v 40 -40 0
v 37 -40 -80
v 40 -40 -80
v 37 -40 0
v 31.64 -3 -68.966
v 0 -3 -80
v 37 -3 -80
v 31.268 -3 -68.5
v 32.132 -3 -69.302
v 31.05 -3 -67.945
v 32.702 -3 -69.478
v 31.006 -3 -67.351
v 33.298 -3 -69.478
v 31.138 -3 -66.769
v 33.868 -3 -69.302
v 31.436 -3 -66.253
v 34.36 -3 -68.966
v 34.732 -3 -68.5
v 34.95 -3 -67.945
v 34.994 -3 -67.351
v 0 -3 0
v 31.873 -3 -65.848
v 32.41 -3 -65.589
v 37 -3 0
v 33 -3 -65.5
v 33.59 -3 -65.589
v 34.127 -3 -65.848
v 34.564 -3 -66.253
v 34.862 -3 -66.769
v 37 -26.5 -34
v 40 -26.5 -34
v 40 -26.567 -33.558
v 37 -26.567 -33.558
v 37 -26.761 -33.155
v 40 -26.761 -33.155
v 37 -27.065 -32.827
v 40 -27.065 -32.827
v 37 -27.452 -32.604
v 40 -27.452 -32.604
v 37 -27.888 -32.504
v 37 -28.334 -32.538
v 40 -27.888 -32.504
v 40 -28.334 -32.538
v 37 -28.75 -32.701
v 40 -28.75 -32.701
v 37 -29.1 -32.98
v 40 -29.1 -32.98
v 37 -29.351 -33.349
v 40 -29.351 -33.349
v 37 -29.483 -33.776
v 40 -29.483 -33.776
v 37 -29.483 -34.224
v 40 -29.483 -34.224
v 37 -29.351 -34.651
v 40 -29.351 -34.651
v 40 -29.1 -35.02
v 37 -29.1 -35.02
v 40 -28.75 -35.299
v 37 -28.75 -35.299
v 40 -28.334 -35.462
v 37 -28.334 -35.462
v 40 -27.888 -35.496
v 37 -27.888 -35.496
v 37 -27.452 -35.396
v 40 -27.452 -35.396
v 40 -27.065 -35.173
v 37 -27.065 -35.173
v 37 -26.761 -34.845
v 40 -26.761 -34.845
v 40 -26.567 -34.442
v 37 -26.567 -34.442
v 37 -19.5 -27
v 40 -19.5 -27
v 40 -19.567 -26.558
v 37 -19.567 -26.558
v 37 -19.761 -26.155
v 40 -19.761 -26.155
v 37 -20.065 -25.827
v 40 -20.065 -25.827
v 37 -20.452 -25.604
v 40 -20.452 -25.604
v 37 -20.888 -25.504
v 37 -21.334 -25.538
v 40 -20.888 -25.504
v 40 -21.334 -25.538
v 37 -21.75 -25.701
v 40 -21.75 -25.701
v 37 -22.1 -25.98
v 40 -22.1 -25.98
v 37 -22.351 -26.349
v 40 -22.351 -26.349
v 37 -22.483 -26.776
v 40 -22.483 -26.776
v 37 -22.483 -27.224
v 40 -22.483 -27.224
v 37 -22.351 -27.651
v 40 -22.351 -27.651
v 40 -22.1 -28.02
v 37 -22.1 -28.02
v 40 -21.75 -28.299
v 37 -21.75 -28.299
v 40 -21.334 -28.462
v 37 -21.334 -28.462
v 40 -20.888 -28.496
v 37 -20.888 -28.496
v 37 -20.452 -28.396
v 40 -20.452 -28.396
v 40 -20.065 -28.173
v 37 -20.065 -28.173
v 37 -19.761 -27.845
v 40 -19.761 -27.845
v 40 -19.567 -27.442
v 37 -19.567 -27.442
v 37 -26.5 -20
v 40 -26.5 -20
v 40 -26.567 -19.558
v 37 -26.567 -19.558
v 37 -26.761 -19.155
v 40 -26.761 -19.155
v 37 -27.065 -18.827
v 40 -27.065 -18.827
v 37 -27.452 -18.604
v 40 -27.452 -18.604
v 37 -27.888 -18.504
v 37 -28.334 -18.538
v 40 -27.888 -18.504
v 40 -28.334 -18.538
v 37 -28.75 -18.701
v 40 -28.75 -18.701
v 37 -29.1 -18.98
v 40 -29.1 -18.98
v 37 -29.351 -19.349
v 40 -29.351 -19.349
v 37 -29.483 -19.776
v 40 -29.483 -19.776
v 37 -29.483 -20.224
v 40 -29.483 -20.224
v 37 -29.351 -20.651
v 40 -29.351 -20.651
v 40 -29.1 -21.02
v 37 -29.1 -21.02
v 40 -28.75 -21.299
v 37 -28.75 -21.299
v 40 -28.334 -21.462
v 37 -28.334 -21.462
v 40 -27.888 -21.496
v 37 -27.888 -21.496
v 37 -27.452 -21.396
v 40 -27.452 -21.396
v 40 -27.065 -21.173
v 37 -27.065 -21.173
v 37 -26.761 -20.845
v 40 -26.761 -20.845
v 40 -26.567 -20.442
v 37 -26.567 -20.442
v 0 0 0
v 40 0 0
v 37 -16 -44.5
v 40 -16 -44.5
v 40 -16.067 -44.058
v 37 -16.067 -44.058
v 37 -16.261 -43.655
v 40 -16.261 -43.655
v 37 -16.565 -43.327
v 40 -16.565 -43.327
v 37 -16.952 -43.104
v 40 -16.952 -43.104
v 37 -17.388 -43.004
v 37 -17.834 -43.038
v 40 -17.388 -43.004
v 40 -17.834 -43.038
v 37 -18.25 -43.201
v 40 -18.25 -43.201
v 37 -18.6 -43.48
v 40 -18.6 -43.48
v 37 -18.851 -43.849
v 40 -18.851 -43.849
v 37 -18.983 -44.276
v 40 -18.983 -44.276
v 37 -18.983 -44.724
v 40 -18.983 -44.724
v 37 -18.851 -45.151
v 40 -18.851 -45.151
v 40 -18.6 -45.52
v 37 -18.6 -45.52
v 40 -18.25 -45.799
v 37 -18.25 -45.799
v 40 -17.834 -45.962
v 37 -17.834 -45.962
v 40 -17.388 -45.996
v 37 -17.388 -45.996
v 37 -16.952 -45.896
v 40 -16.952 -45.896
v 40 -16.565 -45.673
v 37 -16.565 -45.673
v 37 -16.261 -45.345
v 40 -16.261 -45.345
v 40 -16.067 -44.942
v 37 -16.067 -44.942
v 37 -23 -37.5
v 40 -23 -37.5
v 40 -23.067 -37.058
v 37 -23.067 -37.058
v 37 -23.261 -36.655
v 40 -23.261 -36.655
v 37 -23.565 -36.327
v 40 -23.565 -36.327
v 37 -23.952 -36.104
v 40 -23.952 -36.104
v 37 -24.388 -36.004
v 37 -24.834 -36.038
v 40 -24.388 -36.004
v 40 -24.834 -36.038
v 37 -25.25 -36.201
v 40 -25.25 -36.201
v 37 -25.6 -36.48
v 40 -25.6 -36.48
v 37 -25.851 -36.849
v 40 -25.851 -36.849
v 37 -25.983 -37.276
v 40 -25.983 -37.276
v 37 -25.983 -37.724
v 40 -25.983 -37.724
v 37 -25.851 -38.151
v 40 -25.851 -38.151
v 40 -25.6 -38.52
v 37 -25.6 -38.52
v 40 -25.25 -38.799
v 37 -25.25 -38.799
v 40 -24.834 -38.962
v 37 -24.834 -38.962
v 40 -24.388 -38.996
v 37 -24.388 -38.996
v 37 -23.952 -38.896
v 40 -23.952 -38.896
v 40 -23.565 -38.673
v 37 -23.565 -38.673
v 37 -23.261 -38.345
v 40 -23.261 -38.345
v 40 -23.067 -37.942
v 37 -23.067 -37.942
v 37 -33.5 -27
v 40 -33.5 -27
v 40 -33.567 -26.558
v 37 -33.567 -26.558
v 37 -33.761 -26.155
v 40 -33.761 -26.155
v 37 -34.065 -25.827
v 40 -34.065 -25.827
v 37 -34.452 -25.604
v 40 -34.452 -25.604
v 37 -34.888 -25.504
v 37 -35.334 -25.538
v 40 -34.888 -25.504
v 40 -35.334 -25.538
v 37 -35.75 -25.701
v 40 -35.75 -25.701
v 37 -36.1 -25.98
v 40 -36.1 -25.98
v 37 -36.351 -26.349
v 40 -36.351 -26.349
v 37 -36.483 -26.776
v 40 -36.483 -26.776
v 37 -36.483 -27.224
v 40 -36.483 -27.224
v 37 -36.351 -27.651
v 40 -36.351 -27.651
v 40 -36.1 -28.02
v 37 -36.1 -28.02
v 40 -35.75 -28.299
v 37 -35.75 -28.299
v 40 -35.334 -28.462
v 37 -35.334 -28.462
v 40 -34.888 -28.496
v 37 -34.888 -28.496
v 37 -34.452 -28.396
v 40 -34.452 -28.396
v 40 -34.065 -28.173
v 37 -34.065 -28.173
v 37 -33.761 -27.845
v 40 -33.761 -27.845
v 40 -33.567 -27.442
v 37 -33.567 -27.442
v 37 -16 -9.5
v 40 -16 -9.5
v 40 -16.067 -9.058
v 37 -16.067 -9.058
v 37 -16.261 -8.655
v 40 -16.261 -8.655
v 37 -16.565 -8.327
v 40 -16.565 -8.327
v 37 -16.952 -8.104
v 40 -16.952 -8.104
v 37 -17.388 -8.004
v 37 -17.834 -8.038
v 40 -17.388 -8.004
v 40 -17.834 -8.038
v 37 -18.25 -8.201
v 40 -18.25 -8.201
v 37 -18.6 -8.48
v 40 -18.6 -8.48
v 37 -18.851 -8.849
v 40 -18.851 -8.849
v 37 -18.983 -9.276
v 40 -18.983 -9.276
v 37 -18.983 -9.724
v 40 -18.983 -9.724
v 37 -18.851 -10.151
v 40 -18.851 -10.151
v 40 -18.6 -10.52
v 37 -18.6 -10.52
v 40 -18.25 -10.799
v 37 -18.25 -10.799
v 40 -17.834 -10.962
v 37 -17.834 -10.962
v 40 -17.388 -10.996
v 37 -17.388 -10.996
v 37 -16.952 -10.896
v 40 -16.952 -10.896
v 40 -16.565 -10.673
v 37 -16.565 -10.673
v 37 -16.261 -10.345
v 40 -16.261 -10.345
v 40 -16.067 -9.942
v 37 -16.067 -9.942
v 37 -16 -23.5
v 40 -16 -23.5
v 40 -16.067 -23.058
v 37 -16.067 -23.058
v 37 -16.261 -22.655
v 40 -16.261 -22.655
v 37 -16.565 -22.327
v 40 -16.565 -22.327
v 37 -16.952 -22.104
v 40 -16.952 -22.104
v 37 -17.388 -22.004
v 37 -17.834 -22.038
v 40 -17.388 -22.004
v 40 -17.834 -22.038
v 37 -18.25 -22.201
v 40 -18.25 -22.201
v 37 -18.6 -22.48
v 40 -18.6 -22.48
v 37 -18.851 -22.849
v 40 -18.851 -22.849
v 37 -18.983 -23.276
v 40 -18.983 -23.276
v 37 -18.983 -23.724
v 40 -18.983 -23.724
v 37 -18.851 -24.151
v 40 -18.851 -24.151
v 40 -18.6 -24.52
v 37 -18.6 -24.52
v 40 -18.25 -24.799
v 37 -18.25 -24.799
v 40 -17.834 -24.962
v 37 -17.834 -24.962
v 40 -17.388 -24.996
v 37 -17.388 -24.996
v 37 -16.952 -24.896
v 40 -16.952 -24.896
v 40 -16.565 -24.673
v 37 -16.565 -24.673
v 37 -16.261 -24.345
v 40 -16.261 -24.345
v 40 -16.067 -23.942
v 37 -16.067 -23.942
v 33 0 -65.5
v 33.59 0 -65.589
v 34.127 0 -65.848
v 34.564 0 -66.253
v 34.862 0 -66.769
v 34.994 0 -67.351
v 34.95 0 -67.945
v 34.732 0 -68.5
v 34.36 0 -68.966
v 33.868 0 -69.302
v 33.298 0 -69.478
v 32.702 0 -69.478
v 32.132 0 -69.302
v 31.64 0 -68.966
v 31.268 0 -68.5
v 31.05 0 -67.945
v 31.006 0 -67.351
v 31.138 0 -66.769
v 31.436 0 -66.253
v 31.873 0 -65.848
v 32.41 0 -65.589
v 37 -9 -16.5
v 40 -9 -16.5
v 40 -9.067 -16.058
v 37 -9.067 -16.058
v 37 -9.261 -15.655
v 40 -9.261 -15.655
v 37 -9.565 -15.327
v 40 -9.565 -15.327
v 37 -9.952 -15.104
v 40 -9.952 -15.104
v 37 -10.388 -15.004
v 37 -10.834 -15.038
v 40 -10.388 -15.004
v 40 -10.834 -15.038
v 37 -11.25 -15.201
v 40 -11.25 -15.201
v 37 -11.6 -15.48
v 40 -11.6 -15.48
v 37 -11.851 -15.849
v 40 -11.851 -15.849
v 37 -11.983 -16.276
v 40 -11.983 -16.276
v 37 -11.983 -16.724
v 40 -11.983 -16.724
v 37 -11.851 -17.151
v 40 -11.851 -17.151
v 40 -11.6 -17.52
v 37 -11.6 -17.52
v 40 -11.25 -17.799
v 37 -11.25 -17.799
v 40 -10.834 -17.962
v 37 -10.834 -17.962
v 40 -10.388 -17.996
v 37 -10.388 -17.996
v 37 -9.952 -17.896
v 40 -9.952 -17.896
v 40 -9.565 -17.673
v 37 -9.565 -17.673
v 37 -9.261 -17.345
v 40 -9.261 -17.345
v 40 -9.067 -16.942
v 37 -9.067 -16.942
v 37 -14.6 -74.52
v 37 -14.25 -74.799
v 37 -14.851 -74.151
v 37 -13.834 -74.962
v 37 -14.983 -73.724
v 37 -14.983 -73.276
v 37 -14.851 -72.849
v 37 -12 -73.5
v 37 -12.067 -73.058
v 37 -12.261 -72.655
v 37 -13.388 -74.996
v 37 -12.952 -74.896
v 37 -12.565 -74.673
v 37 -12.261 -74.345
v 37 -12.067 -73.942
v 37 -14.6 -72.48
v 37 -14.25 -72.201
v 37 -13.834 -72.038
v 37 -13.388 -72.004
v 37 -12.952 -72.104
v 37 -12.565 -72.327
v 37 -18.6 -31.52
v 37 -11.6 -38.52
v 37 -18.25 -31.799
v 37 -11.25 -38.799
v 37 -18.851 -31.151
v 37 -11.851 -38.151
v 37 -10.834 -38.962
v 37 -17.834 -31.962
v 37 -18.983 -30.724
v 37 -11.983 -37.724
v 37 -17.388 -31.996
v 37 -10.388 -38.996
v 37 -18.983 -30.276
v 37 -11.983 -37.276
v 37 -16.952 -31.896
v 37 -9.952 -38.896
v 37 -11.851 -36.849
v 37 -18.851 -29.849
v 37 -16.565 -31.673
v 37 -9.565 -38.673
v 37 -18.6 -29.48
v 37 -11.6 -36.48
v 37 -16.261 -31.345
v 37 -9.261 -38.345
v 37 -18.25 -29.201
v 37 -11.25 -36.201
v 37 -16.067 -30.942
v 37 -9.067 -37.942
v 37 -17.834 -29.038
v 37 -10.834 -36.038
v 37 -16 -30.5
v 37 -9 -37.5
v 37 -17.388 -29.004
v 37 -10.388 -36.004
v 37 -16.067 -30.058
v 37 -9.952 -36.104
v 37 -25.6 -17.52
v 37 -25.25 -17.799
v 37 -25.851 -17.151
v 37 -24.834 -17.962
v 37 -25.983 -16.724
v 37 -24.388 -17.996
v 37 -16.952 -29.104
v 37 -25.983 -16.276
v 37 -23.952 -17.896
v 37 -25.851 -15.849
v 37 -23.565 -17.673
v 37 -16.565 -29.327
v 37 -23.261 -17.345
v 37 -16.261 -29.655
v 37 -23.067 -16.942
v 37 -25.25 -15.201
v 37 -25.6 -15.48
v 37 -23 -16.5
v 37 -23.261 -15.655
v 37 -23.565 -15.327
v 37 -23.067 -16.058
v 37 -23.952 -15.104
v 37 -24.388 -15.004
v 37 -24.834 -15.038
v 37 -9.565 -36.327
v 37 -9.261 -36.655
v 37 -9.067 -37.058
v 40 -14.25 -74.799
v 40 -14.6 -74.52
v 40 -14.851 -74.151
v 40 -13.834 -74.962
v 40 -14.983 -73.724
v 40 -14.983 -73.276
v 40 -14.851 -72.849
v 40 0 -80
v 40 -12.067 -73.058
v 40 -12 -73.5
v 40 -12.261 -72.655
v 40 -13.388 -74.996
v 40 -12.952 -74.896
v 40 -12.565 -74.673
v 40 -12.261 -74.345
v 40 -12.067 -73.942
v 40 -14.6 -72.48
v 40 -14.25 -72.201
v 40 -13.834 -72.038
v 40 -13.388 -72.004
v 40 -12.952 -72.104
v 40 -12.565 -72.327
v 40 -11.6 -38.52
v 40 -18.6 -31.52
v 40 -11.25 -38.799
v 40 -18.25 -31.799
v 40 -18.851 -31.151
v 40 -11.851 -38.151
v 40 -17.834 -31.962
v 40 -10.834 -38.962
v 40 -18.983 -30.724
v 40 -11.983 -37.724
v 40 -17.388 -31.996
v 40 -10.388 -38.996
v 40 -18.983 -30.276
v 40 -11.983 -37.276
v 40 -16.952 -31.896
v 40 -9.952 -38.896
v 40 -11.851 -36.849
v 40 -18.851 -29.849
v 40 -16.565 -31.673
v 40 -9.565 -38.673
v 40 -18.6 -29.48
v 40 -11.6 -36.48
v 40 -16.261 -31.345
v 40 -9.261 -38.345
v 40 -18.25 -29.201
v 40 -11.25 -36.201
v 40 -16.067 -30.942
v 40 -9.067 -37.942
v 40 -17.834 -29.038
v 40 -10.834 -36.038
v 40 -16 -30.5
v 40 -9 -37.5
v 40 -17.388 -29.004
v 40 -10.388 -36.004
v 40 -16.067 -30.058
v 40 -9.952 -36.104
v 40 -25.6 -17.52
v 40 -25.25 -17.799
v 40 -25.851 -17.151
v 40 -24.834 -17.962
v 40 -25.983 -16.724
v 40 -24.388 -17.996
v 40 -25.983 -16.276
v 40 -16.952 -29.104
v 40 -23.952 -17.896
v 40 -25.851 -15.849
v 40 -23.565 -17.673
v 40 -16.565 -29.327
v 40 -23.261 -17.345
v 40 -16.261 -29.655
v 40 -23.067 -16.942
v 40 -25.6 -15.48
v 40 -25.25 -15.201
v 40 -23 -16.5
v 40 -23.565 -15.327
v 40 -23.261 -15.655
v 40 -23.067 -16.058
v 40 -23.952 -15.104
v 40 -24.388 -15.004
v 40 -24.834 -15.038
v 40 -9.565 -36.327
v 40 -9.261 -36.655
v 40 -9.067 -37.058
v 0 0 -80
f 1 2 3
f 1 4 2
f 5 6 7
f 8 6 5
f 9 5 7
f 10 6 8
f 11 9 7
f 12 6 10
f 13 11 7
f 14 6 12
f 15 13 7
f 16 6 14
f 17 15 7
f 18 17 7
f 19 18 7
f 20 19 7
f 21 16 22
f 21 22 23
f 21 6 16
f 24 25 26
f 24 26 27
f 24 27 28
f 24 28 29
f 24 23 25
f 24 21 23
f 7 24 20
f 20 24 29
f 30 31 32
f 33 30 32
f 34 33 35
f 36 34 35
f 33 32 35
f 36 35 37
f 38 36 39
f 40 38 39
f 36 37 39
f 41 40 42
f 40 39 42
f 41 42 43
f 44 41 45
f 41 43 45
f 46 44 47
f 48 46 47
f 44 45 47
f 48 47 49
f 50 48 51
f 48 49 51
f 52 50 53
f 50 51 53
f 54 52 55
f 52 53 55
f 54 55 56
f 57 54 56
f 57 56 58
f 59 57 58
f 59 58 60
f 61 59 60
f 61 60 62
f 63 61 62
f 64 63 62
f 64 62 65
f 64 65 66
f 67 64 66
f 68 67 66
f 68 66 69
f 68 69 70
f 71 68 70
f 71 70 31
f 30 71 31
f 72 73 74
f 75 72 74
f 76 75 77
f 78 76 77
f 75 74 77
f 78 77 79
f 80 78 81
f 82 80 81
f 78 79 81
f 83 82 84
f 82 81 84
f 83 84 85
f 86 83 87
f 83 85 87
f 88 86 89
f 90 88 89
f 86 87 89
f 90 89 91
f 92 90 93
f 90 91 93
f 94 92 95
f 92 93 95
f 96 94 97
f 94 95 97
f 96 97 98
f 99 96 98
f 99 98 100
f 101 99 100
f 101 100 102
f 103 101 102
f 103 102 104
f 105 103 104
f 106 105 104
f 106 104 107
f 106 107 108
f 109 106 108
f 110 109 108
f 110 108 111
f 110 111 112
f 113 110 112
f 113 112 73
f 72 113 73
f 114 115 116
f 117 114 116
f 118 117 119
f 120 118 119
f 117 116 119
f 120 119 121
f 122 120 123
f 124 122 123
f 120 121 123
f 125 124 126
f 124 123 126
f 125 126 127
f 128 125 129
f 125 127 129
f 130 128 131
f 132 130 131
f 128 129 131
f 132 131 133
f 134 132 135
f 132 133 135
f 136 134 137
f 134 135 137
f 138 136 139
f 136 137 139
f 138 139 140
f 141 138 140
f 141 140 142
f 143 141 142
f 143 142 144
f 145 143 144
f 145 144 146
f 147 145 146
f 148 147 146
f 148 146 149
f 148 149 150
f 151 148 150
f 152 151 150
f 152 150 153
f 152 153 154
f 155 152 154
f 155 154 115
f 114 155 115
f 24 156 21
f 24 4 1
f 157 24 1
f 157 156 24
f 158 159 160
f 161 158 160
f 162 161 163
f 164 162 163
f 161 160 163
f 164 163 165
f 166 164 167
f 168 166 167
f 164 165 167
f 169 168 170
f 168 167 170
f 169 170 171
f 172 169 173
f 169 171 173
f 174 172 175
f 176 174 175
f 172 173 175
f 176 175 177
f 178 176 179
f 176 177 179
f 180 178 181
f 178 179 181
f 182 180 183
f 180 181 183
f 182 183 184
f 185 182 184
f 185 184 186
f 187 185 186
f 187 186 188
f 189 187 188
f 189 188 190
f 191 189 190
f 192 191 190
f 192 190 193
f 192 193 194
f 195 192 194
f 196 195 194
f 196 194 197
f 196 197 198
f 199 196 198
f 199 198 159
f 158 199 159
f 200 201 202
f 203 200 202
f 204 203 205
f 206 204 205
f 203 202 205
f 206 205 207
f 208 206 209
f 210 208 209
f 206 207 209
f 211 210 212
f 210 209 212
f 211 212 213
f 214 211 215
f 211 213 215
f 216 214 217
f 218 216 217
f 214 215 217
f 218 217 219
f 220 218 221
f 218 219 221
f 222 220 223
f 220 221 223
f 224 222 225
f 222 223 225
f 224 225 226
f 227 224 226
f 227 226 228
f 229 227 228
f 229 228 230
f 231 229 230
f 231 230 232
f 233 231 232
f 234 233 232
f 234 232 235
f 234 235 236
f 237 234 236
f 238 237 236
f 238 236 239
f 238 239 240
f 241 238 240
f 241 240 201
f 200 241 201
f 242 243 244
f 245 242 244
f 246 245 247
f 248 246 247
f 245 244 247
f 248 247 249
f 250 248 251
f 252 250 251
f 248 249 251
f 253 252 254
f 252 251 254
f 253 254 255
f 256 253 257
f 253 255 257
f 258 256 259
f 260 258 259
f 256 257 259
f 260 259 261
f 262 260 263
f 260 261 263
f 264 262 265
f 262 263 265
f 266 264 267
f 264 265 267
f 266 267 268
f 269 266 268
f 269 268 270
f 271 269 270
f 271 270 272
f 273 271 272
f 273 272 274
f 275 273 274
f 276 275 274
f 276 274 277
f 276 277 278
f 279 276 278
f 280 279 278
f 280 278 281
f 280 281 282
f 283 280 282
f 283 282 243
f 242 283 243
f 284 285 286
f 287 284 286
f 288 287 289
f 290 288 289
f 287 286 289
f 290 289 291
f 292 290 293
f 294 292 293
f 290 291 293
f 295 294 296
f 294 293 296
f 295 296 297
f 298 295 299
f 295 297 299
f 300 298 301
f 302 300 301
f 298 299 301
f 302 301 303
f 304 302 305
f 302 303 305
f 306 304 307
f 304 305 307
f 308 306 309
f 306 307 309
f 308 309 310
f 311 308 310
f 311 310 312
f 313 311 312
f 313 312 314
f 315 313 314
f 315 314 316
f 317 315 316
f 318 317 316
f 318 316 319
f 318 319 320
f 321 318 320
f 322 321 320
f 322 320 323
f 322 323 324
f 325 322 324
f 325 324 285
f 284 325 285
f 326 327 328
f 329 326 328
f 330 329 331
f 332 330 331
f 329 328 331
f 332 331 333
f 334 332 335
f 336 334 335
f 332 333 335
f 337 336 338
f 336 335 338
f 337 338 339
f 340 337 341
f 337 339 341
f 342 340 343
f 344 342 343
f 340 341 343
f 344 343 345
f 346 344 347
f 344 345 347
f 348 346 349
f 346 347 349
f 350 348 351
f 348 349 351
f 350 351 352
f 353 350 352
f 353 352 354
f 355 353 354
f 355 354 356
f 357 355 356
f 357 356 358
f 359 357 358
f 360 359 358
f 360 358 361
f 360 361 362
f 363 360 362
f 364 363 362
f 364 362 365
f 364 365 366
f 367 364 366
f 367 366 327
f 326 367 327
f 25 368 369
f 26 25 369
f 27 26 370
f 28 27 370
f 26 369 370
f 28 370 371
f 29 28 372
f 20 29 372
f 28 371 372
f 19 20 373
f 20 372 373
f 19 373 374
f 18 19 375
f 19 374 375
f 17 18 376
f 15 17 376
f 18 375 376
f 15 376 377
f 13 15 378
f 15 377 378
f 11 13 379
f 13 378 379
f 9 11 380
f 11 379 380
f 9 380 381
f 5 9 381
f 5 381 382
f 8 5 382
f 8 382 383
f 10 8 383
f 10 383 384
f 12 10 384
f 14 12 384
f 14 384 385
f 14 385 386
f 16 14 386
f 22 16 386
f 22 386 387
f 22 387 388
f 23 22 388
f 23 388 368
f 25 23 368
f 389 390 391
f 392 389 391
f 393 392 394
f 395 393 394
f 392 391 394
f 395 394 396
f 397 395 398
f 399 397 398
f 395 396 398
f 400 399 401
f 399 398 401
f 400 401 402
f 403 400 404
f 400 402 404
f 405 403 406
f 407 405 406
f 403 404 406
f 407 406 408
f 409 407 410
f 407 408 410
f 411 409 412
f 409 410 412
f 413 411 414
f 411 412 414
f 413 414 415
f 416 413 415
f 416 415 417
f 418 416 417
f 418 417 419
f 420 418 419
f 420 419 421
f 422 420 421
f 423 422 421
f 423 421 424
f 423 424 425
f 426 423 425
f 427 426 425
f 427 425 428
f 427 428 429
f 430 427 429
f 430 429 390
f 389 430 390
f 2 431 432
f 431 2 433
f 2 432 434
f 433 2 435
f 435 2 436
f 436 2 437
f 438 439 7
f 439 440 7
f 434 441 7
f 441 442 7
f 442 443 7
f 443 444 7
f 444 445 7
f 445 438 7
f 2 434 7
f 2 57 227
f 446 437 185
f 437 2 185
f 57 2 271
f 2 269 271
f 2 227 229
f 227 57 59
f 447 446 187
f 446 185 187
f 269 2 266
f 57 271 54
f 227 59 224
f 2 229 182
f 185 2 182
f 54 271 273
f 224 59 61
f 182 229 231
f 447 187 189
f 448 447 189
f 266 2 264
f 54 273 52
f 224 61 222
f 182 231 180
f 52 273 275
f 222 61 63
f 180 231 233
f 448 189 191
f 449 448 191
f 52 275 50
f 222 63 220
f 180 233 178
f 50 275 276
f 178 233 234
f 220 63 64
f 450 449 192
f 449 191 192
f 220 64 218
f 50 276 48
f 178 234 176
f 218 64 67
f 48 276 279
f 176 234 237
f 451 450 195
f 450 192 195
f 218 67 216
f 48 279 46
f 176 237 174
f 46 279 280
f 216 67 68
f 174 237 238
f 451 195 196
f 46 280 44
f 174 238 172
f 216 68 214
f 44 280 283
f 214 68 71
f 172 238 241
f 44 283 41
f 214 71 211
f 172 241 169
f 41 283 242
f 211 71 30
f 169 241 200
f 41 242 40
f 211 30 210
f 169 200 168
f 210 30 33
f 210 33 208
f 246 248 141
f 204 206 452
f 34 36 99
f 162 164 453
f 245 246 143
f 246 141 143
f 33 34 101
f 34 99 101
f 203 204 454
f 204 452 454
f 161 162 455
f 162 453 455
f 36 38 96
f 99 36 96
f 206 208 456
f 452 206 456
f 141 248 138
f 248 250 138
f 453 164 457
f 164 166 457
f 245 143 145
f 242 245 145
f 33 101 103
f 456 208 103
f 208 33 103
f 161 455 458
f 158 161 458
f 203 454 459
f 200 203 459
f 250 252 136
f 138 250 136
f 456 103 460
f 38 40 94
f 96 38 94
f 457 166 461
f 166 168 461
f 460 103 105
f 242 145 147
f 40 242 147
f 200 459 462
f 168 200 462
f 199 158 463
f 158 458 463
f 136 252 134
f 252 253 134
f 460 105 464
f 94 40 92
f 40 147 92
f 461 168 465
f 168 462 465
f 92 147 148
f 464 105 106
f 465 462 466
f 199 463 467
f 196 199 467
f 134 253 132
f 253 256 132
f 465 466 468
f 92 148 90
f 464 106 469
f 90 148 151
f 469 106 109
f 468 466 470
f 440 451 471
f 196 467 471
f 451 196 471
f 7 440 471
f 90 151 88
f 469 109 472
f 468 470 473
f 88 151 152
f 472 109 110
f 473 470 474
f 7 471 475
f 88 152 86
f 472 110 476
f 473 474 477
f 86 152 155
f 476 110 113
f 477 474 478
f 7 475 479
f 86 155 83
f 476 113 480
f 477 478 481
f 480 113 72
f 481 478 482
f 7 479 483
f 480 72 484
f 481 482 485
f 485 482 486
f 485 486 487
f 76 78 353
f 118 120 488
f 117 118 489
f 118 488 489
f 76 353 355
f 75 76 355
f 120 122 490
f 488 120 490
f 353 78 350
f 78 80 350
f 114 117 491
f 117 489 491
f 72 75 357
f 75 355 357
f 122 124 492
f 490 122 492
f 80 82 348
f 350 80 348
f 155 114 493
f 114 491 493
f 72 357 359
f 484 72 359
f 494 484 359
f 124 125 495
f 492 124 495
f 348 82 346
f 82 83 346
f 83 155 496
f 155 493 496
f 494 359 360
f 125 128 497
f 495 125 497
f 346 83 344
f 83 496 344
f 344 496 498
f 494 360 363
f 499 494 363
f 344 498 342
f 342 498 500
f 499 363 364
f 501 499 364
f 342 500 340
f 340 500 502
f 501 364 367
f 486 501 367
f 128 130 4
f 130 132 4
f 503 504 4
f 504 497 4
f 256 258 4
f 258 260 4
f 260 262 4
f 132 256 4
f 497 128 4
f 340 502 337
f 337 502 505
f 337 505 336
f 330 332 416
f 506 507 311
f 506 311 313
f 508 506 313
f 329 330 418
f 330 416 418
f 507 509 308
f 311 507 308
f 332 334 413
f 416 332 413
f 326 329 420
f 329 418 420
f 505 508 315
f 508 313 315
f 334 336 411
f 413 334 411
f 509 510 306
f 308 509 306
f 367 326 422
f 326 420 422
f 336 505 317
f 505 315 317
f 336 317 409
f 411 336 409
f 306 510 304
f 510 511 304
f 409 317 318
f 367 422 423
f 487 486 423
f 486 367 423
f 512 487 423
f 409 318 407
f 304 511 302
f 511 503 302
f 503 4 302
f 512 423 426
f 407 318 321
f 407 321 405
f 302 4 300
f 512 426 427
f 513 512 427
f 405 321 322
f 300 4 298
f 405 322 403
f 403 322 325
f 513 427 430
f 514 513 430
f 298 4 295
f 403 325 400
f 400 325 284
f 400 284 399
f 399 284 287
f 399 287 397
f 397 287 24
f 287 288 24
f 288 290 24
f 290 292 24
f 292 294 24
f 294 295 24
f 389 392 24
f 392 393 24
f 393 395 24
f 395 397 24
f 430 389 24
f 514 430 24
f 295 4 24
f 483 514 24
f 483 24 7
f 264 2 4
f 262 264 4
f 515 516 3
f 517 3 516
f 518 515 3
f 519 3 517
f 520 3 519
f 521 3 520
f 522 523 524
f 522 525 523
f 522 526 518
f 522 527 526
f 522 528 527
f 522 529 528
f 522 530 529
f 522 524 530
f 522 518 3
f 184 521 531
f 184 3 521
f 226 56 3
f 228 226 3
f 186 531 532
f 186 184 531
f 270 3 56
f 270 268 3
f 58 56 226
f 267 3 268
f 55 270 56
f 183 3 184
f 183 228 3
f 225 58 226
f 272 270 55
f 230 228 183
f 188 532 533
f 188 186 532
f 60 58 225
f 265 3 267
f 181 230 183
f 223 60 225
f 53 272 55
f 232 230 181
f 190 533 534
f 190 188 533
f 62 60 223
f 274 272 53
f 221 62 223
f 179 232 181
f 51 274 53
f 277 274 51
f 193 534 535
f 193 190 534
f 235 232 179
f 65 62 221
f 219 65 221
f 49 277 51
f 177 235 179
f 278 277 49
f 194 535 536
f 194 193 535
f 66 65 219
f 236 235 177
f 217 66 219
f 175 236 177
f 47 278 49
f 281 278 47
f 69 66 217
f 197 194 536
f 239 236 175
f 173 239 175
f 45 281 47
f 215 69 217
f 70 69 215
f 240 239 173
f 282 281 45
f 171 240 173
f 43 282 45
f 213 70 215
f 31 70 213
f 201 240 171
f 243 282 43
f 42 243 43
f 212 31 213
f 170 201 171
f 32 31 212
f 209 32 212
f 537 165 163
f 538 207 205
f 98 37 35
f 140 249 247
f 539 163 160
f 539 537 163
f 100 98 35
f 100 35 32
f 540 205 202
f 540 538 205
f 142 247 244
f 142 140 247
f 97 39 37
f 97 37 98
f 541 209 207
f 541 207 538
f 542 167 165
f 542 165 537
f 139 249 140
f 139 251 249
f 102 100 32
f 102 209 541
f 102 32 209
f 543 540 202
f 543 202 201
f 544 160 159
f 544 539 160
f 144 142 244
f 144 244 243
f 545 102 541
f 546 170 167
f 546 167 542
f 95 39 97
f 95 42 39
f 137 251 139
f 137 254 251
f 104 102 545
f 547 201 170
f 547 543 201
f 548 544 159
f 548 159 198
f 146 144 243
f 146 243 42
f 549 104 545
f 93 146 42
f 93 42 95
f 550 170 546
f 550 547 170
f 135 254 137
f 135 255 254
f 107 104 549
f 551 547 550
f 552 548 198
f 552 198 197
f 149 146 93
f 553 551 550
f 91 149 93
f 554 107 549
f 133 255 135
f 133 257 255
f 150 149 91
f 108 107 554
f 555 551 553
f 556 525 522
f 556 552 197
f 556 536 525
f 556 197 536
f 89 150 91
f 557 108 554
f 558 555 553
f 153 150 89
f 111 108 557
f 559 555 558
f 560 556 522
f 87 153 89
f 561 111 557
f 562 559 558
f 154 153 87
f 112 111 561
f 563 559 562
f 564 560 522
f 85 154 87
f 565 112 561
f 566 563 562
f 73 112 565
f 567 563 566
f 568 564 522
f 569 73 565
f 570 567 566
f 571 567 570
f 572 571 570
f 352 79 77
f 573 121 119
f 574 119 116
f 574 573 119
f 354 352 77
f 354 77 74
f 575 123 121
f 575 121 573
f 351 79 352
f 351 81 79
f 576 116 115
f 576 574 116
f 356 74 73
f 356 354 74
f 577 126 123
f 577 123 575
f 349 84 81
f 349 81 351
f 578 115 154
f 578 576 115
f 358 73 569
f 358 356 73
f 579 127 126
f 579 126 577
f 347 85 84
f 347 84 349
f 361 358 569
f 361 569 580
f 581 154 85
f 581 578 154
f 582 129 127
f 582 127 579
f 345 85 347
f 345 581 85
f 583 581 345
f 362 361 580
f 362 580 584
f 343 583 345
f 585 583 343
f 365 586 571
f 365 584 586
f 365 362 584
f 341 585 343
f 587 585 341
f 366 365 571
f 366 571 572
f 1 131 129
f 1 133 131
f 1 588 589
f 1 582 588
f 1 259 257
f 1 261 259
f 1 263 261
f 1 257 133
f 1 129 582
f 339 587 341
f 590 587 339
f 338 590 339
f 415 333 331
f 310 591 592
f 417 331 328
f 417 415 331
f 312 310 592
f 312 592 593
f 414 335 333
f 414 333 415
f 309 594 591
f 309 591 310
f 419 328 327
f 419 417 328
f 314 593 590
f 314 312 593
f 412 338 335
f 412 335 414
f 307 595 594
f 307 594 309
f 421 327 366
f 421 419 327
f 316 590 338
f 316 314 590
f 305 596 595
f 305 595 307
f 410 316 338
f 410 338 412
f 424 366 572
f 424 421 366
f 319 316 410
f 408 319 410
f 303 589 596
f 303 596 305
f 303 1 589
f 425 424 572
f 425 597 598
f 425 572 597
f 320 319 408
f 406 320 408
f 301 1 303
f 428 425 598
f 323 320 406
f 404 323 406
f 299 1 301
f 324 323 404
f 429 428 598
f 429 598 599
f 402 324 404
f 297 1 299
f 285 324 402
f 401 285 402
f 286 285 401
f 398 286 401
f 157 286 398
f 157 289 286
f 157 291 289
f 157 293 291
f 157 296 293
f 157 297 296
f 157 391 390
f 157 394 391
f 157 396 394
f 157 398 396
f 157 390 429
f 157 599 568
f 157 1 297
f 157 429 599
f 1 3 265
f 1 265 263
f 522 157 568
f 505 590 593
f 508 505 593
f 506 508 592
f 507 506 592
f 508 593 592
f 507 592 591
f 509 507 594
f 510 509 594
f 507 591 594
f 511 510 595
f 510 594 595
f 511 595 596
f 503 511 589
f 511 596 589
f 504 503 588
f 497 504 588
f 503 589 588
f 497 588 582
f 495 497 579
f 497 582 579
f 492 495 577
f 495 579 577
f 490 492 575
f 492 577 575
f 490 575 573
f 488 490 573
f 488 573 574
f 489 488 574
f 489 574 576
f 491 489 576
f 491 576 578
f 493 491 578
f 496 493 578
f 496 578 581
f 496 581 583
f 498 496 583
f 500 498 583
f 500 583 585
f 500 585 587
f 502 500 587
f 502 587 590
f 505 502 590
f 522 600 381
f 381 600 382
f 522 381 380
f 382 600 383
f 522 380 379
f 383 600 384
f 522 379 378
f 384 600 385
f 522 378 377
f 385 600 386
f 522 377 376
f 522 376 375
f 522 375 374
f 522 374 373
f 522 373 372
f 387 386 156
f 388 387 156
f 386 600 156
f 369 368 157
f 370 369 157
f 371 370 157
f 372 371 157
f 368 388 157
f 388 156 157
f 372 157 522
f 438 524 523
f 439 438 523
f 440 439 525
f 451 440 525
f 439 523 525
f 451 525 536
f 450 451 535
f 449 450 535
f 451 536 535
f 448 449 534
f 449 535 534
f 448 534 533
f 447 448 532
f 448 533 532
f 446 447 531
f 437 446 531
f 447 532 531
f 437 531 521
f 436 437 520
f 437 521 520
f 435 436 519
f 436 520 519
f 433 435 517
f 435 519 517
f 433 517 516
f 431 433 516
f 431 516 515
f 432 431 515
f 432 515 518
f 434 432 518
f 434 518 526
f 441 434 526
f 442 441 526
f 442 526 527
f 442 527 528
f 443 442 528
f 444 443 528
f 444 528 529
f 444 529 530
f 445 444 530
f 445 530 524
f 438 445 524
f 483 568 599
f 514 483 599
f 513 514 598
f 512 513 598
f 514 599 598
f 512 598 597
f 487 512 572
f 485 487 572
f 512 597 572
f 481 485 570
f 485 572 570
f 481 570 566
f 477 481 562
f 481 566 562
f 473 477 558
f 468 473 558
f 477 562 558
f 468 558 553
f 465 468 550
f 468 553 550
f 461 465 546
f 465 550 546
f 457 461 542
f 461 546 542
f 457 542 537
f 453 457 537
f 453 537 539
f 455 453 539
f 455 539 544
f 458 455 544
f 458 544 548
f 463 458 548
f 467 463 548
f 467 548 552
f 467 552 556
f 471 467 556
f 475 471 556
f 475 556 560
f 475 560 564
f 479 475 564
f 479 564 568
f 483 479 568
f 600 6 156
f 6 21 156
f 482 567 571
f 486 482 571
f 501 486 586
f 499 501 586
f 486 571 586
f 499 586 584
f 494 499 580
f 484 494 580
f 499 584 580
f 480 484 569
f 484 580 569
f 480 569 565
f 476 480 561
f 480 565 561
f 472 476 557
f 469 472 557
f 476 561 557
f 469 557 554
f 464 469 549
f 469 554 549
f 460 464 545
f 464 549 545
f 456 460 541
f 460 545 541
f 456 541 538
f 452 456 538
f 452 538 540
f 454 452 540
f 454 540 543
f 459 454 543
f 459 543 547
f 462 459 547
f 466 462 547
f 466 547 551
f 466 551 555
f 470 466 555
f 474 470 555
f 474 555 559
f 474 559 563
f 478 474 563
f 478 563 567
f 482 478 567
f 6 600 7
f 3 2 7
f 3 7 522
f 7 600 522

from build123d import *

# Parameters (mm, degrees)
SKETCH_1_W          = 40
SKETCH_1_H          = 40
EXTRUDE_1_DEPTH     = 80
SHELL_1_T           = -3
SKETCH_2_R          = 1.5
CUT_EXTRUDE_1_DEPTH = 98.979589711
SKETCH_3_R          = 2
CUT_EXTRUDE_2_DEPTH = 80


with BuildPart() as part:
    # 草图1 → 凸台-拉伸1 (new body)
    with BuildSketch(Plane.XY):
        with Locations((20, -20)):
            Rectangle(SKETCH_1_W, SKETCH_1_H)
    extrude(amount=-EXTRUDE_1_DEPTH)

    # 抽壳1
    shell_1_openings = [part.faces().sort_by_distance(p)[0] for p in [
        (20, -20, -80),
        (20, -20, 0),
        (20, -40, -40),
        (0, -20, -40),
    ]]
    offset(amount=SHELL_1_T, openings=shell_1_openings, kind=Kind.INTERSECTION)

    # 草图2 → 切除-拉伸1 (cut, through all)
    with BuildSketch(Plane(origin=(40, 0, 0), x_dir=(0, 0, -1), z_dir=(1, 0, 0))):
        with Locations(Location((44.5, -17.5, 0), (0, 0, 90))):
            Circle(SKETCH_2_R)
        with Locations(Location((27, -21, 0), (0, 0, 90))):
            Circle(SKETCH_2_R)
        with Locations(Location((34, -28, 0), (0, 0, 90))):
            Circle(SKETCH_2_R)
        with Locations(Location((27, -35, 0), (0, 0, 90))):
            Circle(SKETCH_2_R)
        with Locations(Location((20, -28, 0), (0, 0, 90))):
            Circle(SKETCH_2_R)
        with Locations(Location((73.5, -13.5, 0), (0, 0, 90))):
            Circle(SKETCH_2_R)
        with Locations(Location((16.5, -10.5, 0), (0, 0, 90))):
            Circle(SKETCH_2_R)
        with Locations(Location((23.5, -17.5, 0), (0, 0, 90))):
            Circle(SKETCH_2_R)
        with Locations(Location((9.5, -17.5, 0), (0, 0, 90))):
            Circle(SKETCH_2_R)
        with Locations(Location((16.5, -24.5, 0), (0, 0, 90))):
            Circle(SKETCH_2_R)
        with Locations(Location((37.5, -24.5, 0), (0, 0, 90))):
            Circle(SKETCH_2_R)
        with Locations(Location((30.5, -17.5, 0), (0, 0, 90))):
            Circle(SKETCH_2_R)
        with Locations(Location((37.5, -10.5, 0), (0, 0, 90))):
            Circle(SKETCH_2_R)
    extrude(amount=-CUT_EXTRUDE_1_DEPTH, mode=Mode.SUBTRACT)

    # 草图3 → 切除-拉伸2 (cut)
    with BuildSketch(Plane(origin=(0, 0, 0), x_dir=(1, 0, 0), z_dir=(0, 1, 0))):
        with Locations(Location((33, 67.5, 0), (0, 0, 270))):
            Circle(SKETCH_3_R)
    extrude(amount=-CUT_EXTRUDE_2_DEPTH, mode=Mode.SUBTRACT)


solid = part.part
